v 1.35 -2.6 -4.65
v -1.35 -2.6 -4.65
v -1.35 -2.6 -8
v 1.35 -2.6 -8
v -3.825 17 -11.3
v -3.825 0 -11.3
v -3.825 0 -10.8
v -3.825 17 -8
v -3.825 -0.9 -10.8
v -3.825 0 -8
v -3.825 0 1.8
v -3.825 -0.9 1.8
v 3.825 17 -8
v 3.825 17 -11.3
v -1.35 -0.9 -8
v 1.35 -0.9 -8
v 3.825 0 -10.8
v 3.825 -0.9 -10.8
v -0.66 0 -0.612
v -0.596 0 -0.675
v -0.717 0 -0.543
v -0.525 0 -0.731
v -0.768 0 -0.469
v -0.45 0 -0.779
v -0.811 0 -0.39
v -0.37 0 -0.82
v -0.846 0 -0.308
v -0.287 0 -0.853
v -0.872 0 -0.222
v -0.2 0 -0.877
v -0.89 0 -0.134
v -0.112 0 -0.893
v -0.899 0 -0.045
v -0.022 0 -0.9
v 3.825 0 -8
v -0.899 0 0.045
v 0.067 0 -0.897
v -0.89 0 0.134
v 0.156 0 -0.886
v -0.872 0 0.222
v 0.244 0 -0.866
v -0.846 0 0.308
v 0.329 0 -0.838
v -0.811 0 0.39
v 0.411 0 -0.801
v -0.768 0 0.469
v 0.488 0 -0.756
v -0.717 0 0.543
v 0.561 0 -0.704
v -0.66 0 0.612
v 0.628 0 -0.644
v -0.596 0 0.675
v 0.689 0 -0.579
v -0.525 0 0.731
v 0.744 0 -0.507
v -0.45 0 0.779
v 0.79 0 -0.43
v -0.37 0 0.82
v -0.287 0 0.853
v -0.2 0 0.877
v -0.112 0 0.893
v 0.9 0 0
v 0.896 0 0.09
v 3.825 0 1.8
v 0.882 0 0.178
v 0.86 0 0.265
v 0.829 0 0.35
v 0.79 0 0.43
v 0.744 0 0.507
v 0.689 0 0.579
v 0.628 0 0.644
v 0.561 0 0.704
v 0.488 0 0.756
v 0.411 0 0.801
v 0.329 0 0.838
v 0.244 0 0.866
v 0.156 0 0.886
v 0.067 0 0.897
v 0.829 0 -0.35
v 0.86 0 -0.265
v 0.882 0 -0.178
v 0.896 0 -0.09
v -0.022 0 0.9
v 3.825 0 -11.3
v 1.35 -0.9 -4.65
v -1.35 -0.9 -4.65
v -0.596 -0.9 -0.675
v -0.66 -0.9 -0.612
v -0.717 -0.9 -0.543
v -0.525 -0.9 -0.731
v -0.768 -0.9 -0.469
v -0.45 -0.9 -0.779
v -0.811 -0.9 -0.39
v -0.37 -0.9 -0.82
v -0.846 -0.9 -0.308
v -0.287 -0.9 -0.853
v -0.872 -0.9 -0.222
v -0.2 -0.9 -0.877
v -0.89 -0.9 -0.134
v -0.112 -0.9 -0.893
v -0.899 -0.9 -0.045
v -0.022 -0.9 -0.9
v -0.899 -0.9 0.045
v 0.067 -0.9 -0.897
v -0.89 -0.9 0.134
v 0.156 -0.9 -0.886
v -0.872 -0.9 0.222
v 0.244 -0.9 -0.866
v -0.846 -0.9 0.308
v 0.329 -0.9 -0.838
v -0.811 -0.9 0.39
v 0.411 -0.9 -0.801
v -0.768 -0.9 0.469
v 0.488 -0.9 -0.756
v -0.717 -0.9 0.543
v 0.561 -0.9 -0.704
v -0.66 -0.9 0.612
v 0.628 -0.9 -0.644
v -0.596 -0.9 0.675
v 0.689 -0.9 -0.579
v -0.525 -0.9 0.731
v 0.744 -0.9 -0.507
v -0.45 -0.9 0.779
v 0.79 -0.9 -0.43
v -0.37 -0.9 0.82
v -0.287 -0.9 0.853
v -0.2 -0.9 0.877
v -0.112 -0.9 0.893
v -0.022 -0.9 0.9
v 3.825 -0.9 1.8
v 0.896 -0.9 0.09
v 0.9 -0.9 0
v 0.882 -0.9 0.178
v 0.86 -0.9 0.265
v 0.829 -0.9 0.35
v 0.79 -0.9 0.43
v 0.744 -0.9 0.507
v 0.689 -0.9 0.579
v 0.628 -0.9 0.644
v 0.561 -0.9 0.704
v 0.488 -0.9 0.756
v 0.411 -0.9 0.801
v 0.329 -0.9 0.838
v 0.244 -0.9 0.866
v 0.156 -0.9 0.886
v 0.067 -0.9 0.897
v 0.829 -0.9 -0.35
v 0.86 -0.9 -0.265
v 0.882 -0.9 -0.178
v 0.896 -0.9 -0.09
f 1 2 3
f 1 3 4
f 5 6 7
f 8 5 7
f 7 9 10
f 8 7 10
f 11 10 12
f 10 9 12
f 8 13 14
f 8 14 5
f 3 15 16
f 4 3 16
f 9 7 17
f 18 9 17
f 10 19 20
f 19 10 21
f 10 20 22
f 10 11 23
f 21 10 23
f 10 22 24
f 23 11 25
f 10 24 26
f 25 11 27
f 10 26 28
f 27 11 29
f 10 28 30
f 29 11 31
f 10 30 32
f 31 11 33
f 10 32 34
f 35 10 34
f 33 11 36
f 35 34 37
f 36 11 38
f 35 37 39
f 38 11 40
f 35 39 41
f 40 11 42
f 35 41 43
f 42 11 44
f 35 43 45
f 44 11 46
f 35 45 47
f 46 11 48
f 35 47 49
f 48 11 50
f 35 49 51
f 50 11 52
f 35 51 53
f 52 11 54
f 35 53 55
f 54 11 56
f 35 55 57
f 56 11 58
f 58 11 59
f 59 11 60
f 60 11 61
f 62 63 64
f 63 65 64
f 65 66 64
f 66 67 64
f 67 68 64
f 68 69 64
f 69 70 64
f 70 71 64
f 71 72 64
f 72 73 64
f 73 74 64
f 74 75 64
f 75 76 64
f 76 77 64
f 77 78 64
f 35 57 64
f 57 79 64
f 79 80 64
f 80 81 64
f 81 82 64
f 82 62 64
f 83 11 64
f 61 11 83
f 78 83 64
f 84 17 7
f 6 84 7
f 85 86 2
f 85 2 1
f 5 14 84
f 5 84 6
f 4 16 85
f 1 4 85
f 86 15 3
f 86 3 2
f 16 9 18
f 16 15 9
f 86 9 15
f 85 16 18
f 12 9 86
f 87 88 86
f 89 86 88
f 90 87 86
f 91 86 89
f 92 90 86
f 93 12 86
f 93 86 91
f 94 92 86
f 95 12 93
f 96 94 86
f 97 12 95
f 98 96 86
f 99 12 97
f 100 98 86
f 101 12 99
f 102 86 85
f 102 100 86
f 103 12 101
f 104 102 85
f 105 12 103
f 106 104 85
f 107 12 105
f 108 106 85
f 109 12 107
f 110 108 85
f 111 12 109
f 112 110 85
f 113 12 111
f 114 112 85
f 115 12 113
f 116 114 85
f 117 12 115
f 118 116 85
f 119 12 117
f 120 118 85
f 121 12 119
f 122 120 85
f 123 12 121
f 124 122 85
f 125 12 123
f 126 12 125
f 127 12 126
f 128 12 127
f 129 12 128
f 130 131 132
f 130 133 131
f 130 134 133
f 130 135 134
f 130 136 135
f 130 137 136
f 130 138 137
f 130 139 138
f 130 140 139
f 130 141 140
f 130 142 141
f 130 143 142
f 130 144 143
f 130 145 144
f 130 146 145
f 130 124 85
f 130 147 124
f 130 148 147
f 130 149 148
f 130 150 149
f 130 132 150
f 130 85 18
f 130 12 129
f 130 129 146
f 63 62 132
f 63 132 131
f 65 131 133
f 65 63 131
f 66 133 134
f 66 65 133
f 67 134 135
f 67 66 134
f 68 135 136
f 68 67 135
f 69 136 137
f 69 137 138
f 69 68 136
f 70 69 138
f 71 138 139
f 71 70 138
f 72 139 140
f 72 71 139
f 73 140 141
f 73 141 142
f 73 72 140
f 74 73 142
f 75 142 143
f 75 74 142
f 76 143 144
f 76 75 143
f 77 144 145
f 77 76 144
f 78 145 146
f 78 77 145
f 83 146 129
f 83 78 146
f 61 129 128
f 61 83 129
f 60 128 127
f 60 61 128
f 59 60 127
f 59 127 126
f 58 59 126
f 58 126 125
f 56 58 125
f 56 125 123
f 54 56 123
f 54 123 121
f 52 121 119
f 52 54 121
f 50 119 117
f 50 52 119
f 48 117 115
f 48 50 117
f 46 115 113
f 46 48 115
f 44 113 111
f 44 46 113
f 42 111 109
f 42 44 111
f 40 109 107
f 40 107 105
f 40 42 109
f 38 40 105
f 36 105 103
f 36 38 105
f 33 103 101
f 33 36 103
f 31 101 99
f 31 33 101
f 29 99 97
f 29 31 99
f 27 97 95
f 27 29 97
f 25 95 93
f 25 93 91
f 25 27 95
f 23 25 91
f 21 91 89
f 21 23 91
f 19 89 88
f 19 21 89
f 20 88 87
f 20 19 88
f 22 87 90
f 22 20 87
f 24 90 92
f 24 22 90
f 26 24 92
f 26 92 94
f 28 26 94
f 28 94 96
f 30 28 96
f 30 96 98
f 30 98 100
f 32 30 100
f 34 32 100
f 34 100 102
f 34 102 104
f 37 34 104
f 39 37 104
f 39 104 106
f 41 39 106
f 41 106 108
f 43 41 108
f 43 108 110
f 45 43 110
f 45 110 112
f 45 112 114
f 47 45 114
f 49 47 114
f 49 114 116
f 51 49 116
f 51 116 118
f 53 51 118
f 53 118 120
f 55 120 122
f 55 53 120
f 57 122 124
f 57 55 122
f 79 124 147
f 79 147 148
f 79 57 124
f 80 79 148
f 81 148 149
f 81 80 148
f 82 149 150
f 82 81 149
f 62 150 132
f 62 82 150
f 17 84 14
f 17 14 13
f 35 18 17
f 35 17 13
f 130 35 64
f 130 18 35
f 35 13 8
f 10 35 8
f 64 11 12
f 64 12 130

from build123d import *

# Parameters (mm, degrees)
F0_W     = 7.65
F0_H     = 12.6
F0_R     = 0.9
F1_DEPTH = 0.9
F2_W     = 7.65
F2_H     = 3.3
F3_DEPTH = 17
F4_W     = 2.7
F4_H     = 3.35
F5_DEPTH = 1.7


with BuildPart() as f1:
    # F0 (on Front) → F1 (new body)
    with BuildSketch(Plane.XZ):
        with Locations((0, -4.5)):
            Rectangle(F0_W, F0_H)
        Circle(F0_R, mode=Mode.SUBTRACT)
    extrude(amount=F1_DEPTH)

    # F2 (on face) → F3 (join)
    with BuildSketch(Plane(origin=(0, 0, 0), x_dir=(-1, 0, 0), z_dir=(0, 1, 0))):
        with Locations((0, -9.65)):
            Rectangle(F2_W, F2_H)
    extrude(amount=F3_DEPTH)

    # F4 (on face) → F5 (join)
    with BuildSketch(Plane.XZ.offset(0.9)):
        with Locations((0, -6.325)):
            Rectangle(F4_W, F4_H)
    extrude(amount=F5_DEPTH)


solid = f1.part
